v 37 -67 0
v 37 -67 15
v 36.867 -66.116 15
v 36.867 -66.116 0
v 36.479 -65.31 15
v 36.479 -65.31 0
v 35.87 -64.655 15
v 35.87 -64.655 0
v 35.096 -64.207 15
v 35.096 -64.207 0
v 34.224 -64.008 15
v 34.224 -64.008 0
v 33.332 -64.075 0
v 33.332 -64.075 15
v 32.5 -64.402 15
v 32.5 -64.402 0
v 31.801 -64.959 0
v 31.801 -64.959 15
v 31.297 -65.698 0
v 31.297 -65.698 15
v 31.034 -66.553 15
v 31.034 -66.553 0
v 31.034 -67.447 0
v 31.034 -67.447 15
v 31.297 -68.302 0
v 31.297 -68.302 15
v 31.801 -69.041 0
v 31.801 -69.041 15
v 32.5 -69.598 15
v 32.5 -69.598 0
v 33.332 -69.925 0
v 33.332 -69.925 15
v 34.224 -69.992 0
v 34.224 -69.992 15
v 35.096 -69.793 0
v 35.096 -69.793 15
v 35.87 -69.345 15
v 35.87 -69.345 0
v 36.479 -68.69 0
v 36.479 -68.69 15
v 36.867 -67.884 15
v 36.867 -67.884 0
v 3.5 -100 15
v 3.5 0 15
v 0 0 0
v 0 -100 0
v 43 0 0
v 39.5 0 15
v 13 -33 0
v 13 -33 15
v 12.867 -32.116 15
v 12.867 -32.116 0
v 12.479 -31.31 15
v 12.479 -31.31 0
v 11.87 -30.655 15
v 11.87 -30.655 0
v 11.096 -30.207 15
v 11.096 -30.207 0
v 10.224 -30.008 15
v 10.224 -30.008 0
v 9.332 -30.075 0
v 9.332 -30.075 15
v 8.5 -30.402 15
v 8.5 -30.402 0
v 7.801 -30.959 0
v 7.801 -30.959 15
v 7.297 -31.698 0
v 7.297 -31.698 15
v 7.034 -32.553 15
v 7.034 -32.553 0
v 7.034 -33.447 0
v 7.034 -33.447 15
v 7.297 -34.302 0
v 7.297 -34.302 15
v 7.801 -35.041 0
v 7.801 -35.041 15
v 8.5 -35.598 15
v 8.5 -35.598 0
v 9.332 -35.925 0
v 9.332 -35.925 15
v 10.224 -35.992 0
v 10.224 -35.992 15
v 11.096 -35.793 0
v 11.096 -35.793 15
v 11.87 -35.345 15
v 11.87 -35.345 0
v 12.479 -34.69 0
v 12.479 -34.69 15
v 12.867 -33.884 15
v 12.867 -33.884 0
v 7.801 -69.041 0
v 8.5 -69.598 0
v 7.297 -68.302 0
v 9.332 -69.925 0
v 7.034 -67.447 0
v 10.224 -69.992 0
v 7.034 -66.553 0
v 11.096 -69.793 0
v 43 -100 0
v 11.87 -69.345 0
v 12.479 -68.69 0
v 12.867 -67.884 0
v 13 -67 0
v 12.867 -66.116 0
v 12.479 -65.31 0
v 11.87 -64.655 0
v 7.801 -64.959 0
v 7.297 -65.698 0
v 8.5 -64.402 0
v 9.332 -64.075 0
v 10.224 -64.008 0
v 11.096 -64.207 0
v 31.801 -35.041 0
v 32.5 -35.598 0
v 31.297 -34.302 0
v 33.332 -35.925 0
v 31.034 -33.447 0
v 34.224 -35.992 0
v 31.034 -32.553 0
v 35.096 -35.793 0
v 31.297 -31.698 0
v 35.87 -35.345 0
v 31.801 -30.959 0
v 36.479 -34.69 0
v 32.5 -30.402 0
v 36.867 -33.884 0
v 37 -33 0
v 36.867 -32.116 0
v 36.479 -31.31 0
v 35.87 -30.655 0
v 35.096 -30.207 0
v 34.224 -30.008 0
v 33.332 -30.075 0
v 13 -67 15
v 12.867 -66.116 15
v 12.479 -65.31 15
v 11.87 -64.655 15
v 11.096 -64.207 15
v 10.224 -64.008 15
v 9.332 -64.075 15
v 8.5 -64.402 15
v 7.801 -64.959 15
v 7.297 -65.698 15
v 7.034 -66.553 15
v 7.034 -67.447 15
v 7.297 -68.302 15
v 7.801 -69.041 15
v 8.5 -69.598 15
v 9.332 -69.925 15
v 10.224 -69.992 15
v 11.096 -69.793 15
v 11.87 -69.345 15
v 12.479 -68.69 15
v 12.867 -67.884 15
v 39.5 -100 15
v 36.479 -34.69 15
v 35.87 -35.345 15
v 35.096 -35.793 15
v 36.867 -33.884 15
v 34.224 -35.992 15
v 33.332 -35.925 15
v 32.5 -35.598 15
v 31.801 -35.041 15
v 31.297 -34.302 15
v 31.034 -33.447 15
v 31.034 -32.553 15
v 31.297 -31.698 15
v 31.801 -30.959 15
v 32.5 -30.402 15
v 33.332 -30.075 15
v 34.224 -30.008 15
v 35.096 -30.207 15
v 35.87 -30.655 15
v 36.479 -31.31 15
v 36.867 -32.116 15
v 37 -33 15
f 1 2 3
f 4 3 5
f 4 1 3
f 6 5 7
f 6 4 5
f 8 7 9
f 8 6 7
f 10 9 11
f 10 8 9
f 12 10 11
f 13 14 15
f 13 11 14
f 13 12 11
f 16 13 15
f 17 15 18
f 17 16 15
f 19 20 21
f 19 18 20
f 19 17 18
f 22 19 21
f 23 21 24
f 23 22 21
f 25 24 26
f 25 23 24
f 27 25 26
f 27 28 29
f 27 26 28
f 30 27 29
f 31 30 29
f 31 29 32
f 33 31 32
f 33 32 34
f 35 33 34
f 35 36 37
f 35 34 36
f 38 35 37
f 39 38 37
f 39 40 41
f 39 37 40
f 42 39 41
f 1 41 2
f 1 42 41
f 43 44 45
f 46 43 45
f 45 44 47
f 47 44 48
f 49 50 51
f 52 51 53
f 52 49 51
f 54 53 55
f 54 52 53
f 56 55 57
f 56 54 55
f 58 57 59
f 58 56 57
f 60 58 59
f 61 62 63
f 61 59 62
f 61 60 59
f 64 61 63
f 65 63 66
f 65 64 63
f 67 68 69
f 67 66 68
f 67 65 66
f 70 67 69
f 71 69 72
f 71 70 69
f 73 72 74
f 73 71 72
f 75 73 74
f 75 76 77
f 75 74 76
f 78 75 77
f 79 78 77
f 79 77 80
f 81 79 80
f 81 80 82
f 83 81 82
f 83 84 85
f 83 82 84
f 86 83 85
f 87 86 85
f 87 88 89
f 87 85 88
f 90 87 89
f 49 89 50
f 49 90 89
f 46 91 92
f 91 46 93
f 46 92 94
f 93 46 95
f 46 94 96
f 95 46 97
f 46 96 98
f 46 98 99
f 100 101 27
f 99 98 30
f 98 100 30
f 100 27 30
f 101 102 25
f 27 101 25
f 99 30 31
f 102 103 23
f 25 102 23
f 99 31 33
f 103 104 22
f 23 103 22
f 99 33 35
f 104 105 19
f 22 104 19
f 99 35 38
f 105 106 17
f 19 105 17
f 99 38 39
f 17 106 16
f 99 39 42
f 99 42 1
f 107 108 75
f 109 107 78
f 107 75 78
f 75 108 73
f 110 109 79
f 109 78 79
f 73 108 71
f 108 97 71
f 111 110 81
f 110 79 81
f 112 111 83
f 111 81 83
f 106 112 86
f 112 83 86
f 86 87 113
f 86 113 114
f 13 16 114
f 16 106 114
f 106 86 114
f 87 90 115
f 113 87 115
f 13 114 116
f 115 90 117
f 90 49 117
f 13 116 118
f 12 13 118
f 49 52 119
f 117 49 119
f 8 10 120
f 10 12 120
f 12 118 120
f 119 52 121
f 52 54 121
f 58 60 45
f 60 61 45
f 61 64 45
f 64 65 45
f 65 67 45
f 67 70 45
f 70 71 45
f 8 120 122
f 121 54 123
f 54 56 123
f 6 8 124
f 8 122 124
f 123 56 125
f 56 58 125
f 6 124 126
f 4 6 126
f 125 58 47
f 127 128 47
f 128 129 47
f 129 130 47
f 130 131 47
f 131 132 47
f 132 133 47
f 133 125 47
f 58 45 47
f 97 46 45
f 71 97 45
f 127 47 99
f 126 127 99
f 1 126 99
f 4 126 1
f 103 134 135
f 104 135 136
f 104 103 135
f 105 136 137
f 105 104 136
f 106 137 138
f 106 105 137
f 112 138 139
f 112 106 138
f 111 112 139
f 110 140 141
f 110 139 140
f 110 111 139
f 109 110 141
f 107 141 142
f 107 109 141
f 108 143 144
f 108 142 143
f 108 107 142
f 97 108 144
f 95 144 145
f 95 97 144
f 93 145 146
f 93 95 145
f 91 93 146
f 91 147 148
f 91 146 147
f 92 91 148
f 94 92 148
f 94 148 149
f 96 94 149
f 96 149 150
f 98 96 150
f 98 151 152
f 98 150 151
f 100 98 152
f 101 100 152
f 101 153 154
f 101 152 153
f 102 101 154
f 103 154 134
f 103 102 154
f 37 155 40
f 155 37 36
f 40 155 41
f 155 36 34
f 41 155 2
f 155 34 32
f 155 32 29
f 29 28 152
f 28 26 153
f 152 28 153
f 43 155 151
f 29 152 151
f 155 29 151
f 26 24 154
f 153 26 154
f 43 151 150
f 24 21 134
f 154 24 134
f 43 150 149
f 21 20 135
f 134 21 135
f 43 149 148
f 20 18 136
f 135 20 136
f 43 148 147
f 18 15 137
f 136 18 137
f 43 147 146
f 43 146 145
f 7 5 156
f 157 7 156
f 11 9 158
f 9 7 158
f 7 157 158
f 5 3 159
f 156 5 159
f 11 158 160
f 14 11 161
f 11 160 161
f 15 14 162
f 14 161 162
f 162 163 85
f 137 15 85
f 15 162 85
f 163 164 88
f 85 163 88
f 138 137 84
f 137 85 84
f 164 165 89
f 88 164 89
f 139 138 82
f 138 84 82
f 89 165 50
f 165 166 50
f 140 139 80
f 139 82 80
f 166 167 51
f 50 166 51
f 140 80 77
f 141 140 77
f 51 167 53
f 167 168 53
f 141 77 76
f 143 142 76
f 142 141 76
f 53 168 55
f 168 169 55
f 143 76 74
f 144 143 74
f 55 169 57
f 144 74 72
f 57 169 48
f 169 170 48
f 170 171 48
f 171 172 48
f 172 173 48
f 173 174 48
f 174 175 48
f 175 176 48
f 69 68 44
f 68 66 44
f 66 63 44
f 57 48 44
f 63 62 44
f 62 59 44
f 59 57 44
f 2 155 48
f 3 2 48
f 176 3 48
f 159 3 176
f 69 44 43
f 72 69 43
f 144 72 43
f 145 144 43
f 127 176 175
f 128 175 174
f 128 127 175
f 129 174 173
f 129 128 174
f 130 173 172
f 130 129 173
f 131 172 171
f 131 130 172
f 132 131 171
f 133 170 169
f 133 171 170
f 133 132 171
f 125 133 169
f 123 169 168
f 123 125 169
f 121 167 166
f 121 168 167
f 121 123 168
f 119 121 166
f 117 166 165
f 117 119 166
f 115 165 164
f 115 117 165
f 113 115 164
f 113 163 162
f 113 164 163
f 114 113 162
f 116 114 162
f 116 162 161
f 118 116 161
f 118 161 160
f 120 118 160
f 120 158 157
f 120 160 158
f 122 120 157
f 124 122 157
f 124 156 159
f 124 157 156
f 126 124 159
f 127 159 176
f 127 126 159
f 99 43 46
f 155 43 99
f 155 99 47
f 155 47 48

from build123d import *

# Parameters (mm, degrees)
CYLINDER001_R     = 3
CYLINDER001_DEPTH = 20
CYLINDER002_R     = 3
CYLINDER002_DEPTH = 20
CYLINDER003_R     = 3
CYLINDER003_DEPTH = 20
CYLINDER_R        = 3
CYLINDER_DEPTH    = 20
EXTRUDE_DEPTH     = 100


with BuildPart() as v_lec001:
    # Cylinder001 → Cylinder001 (new body)
    with BuildSketch(Plane(origin=(0, 34, 0), x_dir=(1, 0, 0), z_dir=(0, 0, 1))):
        Circle(CYLINDER001_R)
    extrude(amount=CYLINDER001_DEPTH)


with BuildPart() as v_lec002:
    # Cylinder002 → Cylinder002 (new body)
    with BuildSketch(Plane(origin=(24, 34, 0), x_dir=(1, 0, 0), z_dir=(0, 0, 1))):
        Circle(CYLINDER002_R)
    extrude(amount=CYLINDER002_DEPTH)


with BuildPart() as v_lec003:
    # Cylinder003 → Cylinder003 (new body)
    with BuildSketch(Plane(origin=(24, 0, 0), x_dir=(1, 0, 0), z_dir=(0, 0, 1))):
        Circle(CYLINDER003_R)
    extrude(amount=CYLINDER003_DEPTH)


with BuildPart() as fusion:
    # Cylinder → Cylinder (new body)
    with BuildSketch(Plane.XY):
        Circle(CYLINDER_R)
    extrude(amount=CYLINDER_DEPTH)

    # Fusion: union Válec001, Válec002, Válec003
    add(v_lec001.part)
    add(v_lec002.part)
    add(v_lec003.part)


with BuildPart() as fusion_1:
    # Fusion placement: moved
    add(fusion.part.moved(Location((10, -67, 0))))


with BuildPart() as cut:
    # Sketch → Extrude (new body)
    with BuildSketch(Plane.XZ):
        Polygon((0, 0), (43, 0), (39.5, 15), (3.5, 15), align=None)
    extrude(amount=EXTRUDE_DEPTH)

    # Cut: cut Fusion
    add(fusion_1.part, mode=Mode.SUBTRACT)


solid = cut.part
